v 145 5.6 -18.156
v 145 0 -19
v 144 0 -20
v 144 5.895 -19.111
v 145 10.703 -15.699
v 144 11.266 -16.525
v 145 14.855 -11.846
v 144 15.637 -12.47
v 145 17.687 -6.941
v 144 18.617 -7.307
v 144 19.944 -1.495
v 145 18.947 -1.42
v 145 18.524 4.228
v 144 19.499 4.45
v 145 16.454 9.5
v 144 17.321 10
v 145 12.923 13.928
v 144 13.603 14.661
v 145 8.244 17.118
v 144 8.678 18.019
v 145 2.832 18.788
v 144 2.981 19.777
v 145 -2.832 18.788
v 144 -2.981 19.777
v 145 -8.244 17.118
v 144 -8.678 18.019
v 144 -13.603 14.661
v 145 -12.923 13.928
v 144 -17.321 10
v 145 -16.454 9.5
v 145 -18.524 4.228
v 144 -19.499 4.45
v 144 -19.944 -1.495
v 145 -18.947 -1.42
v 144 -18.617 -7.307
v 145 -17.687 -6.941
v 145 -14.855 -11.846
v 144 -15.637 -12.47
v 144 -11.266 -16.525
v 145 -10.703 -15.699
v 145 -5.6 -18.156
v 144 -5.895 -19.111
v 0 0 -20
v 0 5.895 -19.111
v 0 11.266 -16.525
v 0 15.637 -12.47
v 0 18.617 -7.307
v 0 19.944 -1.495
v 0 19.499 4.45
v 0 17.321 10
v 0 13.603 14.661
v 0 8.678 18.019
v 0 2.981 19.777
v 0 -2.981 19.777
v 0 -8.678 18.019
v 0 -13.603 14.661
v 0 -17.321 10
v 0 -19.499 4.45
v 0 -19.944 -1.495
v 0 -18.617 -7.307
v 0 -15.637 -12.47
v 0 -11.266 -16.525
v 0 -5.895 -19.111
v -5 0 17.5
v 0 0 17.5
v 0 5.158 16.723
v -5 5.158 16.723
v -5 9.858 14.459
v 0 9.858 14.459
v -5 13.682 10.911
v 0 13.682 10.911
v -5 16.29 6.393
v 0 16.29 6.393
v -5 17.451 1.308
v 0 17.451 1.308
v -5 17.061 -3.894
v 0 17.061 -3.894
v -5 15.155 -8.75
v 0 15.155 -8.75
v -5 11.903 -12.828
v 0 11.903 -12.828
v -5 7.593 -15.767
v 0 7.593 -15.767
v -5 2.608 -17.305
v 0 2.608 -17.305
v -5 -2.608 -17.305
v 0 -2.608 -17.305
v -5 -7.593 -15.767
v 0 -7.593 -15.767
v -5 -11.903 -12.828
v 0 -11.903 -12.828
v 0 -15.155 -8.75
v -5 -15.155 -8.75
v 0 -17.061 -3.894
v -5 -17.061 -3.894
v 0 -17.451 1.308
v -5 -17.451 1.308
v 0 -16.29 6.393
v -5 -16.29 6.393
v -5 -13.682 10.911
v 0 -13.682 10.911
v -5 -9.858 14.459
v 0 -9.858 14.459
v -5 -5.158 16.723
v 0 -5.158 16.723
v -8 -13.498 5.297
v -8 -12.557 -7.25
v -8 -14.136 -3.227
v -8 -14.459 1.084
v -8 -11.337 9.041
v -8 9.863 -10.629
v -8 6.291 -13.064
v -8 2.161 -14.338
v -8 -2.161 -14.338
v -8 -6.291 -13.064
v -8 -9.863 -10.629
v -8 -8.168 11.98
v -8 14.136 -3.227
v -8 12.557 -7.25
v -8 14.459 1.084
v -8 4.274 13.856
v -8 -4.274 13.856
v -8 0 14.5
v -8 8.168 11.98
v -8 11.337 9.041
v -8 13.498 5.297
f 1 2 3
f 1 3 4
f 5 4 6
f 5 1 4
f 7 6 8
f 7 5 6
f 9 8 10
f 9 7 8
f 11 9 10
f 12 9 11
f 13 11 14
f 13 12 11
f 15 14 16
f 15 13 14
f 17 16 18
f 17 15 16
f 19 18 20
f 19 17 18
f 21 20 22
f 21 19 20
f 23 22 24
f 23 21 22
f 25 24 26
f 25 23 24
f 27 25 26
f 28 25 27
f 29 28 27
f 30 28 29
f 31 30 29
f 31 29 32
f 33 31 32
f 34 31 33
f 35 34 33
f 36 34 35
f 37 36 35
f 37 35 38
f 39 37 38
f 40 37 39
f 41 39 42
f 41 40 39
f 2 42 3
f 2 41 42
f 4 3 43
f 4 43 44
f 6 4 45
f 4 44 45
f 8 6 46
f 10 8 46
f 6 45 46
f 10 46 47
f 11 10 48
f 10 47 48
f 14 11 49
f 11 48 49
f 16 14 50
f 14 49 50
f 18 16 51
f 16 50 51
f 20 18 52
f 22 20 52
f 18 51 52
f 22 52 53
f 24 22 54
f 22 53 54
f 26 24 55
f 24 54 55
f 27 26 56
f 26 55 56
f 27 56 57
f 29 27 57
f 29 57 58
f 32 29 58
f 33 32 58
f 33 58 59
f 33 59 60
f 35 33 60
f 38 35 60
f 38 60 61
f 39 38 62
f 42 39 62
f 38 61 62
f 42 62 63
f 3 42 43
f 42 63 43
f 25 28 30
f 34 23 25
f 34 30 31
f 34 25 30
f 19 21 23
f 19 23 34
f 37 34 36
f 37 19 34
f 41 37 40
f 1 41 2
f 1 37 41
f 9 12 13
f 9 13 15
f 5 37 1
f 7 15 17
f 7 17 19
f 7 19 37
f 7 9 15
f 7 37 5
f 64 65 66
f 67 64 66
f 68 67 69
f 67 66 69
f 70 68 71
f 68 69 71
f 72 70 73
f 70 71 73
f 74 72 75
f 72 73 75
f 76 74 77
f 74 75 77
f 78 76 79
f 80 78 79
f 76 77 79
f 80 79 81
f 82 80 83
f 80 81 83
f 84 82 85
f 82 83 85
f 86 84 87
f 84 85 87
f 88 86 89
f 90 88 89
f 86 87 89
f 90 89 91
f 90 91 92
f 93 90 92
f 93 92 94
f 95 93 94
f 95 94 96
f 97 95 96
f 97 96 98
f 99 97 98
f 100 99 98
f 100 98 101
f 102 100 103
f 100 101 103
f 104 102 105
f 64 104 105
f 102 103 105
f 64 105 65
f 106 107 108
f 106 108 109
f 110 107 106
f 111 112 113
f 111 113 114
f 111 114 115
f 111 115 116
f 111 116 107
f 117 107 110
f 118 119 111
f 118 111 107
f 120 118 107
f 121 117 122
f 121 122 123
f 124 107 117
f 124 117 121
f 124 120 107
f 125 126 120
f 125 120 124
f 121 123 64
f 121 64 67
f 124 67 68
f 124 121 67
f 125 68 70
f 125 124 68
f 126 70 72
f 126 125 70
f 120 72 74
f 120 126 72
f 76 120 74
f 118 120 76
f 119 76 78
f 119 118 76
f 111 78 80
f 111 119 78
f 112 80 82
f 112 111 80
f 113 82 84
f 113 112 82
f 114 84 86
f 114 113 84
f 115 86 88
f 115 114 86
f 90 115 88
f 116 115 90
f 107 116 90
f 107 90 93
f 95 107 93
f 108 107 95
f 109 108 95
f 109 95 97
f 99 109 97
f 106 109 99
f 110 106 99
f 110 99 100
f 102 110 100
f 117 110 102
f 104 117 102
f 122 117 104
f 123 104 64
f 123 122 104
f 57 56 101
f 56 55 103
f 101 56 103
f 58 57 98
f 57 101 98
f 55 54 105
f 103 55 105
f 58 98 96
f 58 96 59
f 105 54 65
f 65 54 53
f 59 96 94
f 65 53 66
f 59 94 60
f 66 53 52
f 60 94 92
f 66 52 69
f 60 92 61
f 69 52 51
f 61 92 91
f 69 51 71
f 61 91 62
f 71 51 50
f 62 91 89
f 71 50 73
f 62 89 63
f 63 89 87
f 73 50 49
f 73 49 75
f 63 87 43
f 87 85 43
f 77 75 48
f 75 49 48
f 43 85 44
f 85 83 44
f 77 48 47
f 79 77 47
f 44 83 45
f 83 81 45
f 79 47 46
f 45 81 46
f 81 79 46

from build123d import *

# Parameters (mm, degrees)
SKETCH_1_R      = 20
EXTRUDE_1_DEPTH = 145
SKETCH_2_R      = 17.5
EXTRUDE_2_DEPTH = 8
CHAMFER_2_SIZE  = 3
CHAMFER_1_SIZE  = 1


with BuildPart() as part:
    # 草图1 → 凸台-拉伸1 (new body)
    with BuildSketch(Plane(origin=(0, 0, 0), x_dir=(0, 0, -1), z_dir=(1, 0, 0))):
        Circle(SKETCH_1_R)
    extrude(amount=EXTRUDE_1_DEPTH)

    # 草图2 → 凸台-拉伸2 (add)
    with BuildSketch(Plane.ZY):
        Circle(SKETCH_2_R)
    extrude(amount=EXTRUDE_2_DEPTH)

    # 倒角2
    chamfer_2_edges = [part.edges().sort_by_distance(p)[0] for p in [
        (-8, 0, -17.5),
    ]]
    chamfer(chamfer_2_edges, length=CHAMFER_2_SIZE)

    # 倒角1
    chamfer_1_edges = [part.edges().sort_by_distance(p)[0] for p in [
        (145, 0, 20),
    ]]
    chamfer(chamfer_1_edges, length=CHAMFER_1_SIZE)


solid = part.part
